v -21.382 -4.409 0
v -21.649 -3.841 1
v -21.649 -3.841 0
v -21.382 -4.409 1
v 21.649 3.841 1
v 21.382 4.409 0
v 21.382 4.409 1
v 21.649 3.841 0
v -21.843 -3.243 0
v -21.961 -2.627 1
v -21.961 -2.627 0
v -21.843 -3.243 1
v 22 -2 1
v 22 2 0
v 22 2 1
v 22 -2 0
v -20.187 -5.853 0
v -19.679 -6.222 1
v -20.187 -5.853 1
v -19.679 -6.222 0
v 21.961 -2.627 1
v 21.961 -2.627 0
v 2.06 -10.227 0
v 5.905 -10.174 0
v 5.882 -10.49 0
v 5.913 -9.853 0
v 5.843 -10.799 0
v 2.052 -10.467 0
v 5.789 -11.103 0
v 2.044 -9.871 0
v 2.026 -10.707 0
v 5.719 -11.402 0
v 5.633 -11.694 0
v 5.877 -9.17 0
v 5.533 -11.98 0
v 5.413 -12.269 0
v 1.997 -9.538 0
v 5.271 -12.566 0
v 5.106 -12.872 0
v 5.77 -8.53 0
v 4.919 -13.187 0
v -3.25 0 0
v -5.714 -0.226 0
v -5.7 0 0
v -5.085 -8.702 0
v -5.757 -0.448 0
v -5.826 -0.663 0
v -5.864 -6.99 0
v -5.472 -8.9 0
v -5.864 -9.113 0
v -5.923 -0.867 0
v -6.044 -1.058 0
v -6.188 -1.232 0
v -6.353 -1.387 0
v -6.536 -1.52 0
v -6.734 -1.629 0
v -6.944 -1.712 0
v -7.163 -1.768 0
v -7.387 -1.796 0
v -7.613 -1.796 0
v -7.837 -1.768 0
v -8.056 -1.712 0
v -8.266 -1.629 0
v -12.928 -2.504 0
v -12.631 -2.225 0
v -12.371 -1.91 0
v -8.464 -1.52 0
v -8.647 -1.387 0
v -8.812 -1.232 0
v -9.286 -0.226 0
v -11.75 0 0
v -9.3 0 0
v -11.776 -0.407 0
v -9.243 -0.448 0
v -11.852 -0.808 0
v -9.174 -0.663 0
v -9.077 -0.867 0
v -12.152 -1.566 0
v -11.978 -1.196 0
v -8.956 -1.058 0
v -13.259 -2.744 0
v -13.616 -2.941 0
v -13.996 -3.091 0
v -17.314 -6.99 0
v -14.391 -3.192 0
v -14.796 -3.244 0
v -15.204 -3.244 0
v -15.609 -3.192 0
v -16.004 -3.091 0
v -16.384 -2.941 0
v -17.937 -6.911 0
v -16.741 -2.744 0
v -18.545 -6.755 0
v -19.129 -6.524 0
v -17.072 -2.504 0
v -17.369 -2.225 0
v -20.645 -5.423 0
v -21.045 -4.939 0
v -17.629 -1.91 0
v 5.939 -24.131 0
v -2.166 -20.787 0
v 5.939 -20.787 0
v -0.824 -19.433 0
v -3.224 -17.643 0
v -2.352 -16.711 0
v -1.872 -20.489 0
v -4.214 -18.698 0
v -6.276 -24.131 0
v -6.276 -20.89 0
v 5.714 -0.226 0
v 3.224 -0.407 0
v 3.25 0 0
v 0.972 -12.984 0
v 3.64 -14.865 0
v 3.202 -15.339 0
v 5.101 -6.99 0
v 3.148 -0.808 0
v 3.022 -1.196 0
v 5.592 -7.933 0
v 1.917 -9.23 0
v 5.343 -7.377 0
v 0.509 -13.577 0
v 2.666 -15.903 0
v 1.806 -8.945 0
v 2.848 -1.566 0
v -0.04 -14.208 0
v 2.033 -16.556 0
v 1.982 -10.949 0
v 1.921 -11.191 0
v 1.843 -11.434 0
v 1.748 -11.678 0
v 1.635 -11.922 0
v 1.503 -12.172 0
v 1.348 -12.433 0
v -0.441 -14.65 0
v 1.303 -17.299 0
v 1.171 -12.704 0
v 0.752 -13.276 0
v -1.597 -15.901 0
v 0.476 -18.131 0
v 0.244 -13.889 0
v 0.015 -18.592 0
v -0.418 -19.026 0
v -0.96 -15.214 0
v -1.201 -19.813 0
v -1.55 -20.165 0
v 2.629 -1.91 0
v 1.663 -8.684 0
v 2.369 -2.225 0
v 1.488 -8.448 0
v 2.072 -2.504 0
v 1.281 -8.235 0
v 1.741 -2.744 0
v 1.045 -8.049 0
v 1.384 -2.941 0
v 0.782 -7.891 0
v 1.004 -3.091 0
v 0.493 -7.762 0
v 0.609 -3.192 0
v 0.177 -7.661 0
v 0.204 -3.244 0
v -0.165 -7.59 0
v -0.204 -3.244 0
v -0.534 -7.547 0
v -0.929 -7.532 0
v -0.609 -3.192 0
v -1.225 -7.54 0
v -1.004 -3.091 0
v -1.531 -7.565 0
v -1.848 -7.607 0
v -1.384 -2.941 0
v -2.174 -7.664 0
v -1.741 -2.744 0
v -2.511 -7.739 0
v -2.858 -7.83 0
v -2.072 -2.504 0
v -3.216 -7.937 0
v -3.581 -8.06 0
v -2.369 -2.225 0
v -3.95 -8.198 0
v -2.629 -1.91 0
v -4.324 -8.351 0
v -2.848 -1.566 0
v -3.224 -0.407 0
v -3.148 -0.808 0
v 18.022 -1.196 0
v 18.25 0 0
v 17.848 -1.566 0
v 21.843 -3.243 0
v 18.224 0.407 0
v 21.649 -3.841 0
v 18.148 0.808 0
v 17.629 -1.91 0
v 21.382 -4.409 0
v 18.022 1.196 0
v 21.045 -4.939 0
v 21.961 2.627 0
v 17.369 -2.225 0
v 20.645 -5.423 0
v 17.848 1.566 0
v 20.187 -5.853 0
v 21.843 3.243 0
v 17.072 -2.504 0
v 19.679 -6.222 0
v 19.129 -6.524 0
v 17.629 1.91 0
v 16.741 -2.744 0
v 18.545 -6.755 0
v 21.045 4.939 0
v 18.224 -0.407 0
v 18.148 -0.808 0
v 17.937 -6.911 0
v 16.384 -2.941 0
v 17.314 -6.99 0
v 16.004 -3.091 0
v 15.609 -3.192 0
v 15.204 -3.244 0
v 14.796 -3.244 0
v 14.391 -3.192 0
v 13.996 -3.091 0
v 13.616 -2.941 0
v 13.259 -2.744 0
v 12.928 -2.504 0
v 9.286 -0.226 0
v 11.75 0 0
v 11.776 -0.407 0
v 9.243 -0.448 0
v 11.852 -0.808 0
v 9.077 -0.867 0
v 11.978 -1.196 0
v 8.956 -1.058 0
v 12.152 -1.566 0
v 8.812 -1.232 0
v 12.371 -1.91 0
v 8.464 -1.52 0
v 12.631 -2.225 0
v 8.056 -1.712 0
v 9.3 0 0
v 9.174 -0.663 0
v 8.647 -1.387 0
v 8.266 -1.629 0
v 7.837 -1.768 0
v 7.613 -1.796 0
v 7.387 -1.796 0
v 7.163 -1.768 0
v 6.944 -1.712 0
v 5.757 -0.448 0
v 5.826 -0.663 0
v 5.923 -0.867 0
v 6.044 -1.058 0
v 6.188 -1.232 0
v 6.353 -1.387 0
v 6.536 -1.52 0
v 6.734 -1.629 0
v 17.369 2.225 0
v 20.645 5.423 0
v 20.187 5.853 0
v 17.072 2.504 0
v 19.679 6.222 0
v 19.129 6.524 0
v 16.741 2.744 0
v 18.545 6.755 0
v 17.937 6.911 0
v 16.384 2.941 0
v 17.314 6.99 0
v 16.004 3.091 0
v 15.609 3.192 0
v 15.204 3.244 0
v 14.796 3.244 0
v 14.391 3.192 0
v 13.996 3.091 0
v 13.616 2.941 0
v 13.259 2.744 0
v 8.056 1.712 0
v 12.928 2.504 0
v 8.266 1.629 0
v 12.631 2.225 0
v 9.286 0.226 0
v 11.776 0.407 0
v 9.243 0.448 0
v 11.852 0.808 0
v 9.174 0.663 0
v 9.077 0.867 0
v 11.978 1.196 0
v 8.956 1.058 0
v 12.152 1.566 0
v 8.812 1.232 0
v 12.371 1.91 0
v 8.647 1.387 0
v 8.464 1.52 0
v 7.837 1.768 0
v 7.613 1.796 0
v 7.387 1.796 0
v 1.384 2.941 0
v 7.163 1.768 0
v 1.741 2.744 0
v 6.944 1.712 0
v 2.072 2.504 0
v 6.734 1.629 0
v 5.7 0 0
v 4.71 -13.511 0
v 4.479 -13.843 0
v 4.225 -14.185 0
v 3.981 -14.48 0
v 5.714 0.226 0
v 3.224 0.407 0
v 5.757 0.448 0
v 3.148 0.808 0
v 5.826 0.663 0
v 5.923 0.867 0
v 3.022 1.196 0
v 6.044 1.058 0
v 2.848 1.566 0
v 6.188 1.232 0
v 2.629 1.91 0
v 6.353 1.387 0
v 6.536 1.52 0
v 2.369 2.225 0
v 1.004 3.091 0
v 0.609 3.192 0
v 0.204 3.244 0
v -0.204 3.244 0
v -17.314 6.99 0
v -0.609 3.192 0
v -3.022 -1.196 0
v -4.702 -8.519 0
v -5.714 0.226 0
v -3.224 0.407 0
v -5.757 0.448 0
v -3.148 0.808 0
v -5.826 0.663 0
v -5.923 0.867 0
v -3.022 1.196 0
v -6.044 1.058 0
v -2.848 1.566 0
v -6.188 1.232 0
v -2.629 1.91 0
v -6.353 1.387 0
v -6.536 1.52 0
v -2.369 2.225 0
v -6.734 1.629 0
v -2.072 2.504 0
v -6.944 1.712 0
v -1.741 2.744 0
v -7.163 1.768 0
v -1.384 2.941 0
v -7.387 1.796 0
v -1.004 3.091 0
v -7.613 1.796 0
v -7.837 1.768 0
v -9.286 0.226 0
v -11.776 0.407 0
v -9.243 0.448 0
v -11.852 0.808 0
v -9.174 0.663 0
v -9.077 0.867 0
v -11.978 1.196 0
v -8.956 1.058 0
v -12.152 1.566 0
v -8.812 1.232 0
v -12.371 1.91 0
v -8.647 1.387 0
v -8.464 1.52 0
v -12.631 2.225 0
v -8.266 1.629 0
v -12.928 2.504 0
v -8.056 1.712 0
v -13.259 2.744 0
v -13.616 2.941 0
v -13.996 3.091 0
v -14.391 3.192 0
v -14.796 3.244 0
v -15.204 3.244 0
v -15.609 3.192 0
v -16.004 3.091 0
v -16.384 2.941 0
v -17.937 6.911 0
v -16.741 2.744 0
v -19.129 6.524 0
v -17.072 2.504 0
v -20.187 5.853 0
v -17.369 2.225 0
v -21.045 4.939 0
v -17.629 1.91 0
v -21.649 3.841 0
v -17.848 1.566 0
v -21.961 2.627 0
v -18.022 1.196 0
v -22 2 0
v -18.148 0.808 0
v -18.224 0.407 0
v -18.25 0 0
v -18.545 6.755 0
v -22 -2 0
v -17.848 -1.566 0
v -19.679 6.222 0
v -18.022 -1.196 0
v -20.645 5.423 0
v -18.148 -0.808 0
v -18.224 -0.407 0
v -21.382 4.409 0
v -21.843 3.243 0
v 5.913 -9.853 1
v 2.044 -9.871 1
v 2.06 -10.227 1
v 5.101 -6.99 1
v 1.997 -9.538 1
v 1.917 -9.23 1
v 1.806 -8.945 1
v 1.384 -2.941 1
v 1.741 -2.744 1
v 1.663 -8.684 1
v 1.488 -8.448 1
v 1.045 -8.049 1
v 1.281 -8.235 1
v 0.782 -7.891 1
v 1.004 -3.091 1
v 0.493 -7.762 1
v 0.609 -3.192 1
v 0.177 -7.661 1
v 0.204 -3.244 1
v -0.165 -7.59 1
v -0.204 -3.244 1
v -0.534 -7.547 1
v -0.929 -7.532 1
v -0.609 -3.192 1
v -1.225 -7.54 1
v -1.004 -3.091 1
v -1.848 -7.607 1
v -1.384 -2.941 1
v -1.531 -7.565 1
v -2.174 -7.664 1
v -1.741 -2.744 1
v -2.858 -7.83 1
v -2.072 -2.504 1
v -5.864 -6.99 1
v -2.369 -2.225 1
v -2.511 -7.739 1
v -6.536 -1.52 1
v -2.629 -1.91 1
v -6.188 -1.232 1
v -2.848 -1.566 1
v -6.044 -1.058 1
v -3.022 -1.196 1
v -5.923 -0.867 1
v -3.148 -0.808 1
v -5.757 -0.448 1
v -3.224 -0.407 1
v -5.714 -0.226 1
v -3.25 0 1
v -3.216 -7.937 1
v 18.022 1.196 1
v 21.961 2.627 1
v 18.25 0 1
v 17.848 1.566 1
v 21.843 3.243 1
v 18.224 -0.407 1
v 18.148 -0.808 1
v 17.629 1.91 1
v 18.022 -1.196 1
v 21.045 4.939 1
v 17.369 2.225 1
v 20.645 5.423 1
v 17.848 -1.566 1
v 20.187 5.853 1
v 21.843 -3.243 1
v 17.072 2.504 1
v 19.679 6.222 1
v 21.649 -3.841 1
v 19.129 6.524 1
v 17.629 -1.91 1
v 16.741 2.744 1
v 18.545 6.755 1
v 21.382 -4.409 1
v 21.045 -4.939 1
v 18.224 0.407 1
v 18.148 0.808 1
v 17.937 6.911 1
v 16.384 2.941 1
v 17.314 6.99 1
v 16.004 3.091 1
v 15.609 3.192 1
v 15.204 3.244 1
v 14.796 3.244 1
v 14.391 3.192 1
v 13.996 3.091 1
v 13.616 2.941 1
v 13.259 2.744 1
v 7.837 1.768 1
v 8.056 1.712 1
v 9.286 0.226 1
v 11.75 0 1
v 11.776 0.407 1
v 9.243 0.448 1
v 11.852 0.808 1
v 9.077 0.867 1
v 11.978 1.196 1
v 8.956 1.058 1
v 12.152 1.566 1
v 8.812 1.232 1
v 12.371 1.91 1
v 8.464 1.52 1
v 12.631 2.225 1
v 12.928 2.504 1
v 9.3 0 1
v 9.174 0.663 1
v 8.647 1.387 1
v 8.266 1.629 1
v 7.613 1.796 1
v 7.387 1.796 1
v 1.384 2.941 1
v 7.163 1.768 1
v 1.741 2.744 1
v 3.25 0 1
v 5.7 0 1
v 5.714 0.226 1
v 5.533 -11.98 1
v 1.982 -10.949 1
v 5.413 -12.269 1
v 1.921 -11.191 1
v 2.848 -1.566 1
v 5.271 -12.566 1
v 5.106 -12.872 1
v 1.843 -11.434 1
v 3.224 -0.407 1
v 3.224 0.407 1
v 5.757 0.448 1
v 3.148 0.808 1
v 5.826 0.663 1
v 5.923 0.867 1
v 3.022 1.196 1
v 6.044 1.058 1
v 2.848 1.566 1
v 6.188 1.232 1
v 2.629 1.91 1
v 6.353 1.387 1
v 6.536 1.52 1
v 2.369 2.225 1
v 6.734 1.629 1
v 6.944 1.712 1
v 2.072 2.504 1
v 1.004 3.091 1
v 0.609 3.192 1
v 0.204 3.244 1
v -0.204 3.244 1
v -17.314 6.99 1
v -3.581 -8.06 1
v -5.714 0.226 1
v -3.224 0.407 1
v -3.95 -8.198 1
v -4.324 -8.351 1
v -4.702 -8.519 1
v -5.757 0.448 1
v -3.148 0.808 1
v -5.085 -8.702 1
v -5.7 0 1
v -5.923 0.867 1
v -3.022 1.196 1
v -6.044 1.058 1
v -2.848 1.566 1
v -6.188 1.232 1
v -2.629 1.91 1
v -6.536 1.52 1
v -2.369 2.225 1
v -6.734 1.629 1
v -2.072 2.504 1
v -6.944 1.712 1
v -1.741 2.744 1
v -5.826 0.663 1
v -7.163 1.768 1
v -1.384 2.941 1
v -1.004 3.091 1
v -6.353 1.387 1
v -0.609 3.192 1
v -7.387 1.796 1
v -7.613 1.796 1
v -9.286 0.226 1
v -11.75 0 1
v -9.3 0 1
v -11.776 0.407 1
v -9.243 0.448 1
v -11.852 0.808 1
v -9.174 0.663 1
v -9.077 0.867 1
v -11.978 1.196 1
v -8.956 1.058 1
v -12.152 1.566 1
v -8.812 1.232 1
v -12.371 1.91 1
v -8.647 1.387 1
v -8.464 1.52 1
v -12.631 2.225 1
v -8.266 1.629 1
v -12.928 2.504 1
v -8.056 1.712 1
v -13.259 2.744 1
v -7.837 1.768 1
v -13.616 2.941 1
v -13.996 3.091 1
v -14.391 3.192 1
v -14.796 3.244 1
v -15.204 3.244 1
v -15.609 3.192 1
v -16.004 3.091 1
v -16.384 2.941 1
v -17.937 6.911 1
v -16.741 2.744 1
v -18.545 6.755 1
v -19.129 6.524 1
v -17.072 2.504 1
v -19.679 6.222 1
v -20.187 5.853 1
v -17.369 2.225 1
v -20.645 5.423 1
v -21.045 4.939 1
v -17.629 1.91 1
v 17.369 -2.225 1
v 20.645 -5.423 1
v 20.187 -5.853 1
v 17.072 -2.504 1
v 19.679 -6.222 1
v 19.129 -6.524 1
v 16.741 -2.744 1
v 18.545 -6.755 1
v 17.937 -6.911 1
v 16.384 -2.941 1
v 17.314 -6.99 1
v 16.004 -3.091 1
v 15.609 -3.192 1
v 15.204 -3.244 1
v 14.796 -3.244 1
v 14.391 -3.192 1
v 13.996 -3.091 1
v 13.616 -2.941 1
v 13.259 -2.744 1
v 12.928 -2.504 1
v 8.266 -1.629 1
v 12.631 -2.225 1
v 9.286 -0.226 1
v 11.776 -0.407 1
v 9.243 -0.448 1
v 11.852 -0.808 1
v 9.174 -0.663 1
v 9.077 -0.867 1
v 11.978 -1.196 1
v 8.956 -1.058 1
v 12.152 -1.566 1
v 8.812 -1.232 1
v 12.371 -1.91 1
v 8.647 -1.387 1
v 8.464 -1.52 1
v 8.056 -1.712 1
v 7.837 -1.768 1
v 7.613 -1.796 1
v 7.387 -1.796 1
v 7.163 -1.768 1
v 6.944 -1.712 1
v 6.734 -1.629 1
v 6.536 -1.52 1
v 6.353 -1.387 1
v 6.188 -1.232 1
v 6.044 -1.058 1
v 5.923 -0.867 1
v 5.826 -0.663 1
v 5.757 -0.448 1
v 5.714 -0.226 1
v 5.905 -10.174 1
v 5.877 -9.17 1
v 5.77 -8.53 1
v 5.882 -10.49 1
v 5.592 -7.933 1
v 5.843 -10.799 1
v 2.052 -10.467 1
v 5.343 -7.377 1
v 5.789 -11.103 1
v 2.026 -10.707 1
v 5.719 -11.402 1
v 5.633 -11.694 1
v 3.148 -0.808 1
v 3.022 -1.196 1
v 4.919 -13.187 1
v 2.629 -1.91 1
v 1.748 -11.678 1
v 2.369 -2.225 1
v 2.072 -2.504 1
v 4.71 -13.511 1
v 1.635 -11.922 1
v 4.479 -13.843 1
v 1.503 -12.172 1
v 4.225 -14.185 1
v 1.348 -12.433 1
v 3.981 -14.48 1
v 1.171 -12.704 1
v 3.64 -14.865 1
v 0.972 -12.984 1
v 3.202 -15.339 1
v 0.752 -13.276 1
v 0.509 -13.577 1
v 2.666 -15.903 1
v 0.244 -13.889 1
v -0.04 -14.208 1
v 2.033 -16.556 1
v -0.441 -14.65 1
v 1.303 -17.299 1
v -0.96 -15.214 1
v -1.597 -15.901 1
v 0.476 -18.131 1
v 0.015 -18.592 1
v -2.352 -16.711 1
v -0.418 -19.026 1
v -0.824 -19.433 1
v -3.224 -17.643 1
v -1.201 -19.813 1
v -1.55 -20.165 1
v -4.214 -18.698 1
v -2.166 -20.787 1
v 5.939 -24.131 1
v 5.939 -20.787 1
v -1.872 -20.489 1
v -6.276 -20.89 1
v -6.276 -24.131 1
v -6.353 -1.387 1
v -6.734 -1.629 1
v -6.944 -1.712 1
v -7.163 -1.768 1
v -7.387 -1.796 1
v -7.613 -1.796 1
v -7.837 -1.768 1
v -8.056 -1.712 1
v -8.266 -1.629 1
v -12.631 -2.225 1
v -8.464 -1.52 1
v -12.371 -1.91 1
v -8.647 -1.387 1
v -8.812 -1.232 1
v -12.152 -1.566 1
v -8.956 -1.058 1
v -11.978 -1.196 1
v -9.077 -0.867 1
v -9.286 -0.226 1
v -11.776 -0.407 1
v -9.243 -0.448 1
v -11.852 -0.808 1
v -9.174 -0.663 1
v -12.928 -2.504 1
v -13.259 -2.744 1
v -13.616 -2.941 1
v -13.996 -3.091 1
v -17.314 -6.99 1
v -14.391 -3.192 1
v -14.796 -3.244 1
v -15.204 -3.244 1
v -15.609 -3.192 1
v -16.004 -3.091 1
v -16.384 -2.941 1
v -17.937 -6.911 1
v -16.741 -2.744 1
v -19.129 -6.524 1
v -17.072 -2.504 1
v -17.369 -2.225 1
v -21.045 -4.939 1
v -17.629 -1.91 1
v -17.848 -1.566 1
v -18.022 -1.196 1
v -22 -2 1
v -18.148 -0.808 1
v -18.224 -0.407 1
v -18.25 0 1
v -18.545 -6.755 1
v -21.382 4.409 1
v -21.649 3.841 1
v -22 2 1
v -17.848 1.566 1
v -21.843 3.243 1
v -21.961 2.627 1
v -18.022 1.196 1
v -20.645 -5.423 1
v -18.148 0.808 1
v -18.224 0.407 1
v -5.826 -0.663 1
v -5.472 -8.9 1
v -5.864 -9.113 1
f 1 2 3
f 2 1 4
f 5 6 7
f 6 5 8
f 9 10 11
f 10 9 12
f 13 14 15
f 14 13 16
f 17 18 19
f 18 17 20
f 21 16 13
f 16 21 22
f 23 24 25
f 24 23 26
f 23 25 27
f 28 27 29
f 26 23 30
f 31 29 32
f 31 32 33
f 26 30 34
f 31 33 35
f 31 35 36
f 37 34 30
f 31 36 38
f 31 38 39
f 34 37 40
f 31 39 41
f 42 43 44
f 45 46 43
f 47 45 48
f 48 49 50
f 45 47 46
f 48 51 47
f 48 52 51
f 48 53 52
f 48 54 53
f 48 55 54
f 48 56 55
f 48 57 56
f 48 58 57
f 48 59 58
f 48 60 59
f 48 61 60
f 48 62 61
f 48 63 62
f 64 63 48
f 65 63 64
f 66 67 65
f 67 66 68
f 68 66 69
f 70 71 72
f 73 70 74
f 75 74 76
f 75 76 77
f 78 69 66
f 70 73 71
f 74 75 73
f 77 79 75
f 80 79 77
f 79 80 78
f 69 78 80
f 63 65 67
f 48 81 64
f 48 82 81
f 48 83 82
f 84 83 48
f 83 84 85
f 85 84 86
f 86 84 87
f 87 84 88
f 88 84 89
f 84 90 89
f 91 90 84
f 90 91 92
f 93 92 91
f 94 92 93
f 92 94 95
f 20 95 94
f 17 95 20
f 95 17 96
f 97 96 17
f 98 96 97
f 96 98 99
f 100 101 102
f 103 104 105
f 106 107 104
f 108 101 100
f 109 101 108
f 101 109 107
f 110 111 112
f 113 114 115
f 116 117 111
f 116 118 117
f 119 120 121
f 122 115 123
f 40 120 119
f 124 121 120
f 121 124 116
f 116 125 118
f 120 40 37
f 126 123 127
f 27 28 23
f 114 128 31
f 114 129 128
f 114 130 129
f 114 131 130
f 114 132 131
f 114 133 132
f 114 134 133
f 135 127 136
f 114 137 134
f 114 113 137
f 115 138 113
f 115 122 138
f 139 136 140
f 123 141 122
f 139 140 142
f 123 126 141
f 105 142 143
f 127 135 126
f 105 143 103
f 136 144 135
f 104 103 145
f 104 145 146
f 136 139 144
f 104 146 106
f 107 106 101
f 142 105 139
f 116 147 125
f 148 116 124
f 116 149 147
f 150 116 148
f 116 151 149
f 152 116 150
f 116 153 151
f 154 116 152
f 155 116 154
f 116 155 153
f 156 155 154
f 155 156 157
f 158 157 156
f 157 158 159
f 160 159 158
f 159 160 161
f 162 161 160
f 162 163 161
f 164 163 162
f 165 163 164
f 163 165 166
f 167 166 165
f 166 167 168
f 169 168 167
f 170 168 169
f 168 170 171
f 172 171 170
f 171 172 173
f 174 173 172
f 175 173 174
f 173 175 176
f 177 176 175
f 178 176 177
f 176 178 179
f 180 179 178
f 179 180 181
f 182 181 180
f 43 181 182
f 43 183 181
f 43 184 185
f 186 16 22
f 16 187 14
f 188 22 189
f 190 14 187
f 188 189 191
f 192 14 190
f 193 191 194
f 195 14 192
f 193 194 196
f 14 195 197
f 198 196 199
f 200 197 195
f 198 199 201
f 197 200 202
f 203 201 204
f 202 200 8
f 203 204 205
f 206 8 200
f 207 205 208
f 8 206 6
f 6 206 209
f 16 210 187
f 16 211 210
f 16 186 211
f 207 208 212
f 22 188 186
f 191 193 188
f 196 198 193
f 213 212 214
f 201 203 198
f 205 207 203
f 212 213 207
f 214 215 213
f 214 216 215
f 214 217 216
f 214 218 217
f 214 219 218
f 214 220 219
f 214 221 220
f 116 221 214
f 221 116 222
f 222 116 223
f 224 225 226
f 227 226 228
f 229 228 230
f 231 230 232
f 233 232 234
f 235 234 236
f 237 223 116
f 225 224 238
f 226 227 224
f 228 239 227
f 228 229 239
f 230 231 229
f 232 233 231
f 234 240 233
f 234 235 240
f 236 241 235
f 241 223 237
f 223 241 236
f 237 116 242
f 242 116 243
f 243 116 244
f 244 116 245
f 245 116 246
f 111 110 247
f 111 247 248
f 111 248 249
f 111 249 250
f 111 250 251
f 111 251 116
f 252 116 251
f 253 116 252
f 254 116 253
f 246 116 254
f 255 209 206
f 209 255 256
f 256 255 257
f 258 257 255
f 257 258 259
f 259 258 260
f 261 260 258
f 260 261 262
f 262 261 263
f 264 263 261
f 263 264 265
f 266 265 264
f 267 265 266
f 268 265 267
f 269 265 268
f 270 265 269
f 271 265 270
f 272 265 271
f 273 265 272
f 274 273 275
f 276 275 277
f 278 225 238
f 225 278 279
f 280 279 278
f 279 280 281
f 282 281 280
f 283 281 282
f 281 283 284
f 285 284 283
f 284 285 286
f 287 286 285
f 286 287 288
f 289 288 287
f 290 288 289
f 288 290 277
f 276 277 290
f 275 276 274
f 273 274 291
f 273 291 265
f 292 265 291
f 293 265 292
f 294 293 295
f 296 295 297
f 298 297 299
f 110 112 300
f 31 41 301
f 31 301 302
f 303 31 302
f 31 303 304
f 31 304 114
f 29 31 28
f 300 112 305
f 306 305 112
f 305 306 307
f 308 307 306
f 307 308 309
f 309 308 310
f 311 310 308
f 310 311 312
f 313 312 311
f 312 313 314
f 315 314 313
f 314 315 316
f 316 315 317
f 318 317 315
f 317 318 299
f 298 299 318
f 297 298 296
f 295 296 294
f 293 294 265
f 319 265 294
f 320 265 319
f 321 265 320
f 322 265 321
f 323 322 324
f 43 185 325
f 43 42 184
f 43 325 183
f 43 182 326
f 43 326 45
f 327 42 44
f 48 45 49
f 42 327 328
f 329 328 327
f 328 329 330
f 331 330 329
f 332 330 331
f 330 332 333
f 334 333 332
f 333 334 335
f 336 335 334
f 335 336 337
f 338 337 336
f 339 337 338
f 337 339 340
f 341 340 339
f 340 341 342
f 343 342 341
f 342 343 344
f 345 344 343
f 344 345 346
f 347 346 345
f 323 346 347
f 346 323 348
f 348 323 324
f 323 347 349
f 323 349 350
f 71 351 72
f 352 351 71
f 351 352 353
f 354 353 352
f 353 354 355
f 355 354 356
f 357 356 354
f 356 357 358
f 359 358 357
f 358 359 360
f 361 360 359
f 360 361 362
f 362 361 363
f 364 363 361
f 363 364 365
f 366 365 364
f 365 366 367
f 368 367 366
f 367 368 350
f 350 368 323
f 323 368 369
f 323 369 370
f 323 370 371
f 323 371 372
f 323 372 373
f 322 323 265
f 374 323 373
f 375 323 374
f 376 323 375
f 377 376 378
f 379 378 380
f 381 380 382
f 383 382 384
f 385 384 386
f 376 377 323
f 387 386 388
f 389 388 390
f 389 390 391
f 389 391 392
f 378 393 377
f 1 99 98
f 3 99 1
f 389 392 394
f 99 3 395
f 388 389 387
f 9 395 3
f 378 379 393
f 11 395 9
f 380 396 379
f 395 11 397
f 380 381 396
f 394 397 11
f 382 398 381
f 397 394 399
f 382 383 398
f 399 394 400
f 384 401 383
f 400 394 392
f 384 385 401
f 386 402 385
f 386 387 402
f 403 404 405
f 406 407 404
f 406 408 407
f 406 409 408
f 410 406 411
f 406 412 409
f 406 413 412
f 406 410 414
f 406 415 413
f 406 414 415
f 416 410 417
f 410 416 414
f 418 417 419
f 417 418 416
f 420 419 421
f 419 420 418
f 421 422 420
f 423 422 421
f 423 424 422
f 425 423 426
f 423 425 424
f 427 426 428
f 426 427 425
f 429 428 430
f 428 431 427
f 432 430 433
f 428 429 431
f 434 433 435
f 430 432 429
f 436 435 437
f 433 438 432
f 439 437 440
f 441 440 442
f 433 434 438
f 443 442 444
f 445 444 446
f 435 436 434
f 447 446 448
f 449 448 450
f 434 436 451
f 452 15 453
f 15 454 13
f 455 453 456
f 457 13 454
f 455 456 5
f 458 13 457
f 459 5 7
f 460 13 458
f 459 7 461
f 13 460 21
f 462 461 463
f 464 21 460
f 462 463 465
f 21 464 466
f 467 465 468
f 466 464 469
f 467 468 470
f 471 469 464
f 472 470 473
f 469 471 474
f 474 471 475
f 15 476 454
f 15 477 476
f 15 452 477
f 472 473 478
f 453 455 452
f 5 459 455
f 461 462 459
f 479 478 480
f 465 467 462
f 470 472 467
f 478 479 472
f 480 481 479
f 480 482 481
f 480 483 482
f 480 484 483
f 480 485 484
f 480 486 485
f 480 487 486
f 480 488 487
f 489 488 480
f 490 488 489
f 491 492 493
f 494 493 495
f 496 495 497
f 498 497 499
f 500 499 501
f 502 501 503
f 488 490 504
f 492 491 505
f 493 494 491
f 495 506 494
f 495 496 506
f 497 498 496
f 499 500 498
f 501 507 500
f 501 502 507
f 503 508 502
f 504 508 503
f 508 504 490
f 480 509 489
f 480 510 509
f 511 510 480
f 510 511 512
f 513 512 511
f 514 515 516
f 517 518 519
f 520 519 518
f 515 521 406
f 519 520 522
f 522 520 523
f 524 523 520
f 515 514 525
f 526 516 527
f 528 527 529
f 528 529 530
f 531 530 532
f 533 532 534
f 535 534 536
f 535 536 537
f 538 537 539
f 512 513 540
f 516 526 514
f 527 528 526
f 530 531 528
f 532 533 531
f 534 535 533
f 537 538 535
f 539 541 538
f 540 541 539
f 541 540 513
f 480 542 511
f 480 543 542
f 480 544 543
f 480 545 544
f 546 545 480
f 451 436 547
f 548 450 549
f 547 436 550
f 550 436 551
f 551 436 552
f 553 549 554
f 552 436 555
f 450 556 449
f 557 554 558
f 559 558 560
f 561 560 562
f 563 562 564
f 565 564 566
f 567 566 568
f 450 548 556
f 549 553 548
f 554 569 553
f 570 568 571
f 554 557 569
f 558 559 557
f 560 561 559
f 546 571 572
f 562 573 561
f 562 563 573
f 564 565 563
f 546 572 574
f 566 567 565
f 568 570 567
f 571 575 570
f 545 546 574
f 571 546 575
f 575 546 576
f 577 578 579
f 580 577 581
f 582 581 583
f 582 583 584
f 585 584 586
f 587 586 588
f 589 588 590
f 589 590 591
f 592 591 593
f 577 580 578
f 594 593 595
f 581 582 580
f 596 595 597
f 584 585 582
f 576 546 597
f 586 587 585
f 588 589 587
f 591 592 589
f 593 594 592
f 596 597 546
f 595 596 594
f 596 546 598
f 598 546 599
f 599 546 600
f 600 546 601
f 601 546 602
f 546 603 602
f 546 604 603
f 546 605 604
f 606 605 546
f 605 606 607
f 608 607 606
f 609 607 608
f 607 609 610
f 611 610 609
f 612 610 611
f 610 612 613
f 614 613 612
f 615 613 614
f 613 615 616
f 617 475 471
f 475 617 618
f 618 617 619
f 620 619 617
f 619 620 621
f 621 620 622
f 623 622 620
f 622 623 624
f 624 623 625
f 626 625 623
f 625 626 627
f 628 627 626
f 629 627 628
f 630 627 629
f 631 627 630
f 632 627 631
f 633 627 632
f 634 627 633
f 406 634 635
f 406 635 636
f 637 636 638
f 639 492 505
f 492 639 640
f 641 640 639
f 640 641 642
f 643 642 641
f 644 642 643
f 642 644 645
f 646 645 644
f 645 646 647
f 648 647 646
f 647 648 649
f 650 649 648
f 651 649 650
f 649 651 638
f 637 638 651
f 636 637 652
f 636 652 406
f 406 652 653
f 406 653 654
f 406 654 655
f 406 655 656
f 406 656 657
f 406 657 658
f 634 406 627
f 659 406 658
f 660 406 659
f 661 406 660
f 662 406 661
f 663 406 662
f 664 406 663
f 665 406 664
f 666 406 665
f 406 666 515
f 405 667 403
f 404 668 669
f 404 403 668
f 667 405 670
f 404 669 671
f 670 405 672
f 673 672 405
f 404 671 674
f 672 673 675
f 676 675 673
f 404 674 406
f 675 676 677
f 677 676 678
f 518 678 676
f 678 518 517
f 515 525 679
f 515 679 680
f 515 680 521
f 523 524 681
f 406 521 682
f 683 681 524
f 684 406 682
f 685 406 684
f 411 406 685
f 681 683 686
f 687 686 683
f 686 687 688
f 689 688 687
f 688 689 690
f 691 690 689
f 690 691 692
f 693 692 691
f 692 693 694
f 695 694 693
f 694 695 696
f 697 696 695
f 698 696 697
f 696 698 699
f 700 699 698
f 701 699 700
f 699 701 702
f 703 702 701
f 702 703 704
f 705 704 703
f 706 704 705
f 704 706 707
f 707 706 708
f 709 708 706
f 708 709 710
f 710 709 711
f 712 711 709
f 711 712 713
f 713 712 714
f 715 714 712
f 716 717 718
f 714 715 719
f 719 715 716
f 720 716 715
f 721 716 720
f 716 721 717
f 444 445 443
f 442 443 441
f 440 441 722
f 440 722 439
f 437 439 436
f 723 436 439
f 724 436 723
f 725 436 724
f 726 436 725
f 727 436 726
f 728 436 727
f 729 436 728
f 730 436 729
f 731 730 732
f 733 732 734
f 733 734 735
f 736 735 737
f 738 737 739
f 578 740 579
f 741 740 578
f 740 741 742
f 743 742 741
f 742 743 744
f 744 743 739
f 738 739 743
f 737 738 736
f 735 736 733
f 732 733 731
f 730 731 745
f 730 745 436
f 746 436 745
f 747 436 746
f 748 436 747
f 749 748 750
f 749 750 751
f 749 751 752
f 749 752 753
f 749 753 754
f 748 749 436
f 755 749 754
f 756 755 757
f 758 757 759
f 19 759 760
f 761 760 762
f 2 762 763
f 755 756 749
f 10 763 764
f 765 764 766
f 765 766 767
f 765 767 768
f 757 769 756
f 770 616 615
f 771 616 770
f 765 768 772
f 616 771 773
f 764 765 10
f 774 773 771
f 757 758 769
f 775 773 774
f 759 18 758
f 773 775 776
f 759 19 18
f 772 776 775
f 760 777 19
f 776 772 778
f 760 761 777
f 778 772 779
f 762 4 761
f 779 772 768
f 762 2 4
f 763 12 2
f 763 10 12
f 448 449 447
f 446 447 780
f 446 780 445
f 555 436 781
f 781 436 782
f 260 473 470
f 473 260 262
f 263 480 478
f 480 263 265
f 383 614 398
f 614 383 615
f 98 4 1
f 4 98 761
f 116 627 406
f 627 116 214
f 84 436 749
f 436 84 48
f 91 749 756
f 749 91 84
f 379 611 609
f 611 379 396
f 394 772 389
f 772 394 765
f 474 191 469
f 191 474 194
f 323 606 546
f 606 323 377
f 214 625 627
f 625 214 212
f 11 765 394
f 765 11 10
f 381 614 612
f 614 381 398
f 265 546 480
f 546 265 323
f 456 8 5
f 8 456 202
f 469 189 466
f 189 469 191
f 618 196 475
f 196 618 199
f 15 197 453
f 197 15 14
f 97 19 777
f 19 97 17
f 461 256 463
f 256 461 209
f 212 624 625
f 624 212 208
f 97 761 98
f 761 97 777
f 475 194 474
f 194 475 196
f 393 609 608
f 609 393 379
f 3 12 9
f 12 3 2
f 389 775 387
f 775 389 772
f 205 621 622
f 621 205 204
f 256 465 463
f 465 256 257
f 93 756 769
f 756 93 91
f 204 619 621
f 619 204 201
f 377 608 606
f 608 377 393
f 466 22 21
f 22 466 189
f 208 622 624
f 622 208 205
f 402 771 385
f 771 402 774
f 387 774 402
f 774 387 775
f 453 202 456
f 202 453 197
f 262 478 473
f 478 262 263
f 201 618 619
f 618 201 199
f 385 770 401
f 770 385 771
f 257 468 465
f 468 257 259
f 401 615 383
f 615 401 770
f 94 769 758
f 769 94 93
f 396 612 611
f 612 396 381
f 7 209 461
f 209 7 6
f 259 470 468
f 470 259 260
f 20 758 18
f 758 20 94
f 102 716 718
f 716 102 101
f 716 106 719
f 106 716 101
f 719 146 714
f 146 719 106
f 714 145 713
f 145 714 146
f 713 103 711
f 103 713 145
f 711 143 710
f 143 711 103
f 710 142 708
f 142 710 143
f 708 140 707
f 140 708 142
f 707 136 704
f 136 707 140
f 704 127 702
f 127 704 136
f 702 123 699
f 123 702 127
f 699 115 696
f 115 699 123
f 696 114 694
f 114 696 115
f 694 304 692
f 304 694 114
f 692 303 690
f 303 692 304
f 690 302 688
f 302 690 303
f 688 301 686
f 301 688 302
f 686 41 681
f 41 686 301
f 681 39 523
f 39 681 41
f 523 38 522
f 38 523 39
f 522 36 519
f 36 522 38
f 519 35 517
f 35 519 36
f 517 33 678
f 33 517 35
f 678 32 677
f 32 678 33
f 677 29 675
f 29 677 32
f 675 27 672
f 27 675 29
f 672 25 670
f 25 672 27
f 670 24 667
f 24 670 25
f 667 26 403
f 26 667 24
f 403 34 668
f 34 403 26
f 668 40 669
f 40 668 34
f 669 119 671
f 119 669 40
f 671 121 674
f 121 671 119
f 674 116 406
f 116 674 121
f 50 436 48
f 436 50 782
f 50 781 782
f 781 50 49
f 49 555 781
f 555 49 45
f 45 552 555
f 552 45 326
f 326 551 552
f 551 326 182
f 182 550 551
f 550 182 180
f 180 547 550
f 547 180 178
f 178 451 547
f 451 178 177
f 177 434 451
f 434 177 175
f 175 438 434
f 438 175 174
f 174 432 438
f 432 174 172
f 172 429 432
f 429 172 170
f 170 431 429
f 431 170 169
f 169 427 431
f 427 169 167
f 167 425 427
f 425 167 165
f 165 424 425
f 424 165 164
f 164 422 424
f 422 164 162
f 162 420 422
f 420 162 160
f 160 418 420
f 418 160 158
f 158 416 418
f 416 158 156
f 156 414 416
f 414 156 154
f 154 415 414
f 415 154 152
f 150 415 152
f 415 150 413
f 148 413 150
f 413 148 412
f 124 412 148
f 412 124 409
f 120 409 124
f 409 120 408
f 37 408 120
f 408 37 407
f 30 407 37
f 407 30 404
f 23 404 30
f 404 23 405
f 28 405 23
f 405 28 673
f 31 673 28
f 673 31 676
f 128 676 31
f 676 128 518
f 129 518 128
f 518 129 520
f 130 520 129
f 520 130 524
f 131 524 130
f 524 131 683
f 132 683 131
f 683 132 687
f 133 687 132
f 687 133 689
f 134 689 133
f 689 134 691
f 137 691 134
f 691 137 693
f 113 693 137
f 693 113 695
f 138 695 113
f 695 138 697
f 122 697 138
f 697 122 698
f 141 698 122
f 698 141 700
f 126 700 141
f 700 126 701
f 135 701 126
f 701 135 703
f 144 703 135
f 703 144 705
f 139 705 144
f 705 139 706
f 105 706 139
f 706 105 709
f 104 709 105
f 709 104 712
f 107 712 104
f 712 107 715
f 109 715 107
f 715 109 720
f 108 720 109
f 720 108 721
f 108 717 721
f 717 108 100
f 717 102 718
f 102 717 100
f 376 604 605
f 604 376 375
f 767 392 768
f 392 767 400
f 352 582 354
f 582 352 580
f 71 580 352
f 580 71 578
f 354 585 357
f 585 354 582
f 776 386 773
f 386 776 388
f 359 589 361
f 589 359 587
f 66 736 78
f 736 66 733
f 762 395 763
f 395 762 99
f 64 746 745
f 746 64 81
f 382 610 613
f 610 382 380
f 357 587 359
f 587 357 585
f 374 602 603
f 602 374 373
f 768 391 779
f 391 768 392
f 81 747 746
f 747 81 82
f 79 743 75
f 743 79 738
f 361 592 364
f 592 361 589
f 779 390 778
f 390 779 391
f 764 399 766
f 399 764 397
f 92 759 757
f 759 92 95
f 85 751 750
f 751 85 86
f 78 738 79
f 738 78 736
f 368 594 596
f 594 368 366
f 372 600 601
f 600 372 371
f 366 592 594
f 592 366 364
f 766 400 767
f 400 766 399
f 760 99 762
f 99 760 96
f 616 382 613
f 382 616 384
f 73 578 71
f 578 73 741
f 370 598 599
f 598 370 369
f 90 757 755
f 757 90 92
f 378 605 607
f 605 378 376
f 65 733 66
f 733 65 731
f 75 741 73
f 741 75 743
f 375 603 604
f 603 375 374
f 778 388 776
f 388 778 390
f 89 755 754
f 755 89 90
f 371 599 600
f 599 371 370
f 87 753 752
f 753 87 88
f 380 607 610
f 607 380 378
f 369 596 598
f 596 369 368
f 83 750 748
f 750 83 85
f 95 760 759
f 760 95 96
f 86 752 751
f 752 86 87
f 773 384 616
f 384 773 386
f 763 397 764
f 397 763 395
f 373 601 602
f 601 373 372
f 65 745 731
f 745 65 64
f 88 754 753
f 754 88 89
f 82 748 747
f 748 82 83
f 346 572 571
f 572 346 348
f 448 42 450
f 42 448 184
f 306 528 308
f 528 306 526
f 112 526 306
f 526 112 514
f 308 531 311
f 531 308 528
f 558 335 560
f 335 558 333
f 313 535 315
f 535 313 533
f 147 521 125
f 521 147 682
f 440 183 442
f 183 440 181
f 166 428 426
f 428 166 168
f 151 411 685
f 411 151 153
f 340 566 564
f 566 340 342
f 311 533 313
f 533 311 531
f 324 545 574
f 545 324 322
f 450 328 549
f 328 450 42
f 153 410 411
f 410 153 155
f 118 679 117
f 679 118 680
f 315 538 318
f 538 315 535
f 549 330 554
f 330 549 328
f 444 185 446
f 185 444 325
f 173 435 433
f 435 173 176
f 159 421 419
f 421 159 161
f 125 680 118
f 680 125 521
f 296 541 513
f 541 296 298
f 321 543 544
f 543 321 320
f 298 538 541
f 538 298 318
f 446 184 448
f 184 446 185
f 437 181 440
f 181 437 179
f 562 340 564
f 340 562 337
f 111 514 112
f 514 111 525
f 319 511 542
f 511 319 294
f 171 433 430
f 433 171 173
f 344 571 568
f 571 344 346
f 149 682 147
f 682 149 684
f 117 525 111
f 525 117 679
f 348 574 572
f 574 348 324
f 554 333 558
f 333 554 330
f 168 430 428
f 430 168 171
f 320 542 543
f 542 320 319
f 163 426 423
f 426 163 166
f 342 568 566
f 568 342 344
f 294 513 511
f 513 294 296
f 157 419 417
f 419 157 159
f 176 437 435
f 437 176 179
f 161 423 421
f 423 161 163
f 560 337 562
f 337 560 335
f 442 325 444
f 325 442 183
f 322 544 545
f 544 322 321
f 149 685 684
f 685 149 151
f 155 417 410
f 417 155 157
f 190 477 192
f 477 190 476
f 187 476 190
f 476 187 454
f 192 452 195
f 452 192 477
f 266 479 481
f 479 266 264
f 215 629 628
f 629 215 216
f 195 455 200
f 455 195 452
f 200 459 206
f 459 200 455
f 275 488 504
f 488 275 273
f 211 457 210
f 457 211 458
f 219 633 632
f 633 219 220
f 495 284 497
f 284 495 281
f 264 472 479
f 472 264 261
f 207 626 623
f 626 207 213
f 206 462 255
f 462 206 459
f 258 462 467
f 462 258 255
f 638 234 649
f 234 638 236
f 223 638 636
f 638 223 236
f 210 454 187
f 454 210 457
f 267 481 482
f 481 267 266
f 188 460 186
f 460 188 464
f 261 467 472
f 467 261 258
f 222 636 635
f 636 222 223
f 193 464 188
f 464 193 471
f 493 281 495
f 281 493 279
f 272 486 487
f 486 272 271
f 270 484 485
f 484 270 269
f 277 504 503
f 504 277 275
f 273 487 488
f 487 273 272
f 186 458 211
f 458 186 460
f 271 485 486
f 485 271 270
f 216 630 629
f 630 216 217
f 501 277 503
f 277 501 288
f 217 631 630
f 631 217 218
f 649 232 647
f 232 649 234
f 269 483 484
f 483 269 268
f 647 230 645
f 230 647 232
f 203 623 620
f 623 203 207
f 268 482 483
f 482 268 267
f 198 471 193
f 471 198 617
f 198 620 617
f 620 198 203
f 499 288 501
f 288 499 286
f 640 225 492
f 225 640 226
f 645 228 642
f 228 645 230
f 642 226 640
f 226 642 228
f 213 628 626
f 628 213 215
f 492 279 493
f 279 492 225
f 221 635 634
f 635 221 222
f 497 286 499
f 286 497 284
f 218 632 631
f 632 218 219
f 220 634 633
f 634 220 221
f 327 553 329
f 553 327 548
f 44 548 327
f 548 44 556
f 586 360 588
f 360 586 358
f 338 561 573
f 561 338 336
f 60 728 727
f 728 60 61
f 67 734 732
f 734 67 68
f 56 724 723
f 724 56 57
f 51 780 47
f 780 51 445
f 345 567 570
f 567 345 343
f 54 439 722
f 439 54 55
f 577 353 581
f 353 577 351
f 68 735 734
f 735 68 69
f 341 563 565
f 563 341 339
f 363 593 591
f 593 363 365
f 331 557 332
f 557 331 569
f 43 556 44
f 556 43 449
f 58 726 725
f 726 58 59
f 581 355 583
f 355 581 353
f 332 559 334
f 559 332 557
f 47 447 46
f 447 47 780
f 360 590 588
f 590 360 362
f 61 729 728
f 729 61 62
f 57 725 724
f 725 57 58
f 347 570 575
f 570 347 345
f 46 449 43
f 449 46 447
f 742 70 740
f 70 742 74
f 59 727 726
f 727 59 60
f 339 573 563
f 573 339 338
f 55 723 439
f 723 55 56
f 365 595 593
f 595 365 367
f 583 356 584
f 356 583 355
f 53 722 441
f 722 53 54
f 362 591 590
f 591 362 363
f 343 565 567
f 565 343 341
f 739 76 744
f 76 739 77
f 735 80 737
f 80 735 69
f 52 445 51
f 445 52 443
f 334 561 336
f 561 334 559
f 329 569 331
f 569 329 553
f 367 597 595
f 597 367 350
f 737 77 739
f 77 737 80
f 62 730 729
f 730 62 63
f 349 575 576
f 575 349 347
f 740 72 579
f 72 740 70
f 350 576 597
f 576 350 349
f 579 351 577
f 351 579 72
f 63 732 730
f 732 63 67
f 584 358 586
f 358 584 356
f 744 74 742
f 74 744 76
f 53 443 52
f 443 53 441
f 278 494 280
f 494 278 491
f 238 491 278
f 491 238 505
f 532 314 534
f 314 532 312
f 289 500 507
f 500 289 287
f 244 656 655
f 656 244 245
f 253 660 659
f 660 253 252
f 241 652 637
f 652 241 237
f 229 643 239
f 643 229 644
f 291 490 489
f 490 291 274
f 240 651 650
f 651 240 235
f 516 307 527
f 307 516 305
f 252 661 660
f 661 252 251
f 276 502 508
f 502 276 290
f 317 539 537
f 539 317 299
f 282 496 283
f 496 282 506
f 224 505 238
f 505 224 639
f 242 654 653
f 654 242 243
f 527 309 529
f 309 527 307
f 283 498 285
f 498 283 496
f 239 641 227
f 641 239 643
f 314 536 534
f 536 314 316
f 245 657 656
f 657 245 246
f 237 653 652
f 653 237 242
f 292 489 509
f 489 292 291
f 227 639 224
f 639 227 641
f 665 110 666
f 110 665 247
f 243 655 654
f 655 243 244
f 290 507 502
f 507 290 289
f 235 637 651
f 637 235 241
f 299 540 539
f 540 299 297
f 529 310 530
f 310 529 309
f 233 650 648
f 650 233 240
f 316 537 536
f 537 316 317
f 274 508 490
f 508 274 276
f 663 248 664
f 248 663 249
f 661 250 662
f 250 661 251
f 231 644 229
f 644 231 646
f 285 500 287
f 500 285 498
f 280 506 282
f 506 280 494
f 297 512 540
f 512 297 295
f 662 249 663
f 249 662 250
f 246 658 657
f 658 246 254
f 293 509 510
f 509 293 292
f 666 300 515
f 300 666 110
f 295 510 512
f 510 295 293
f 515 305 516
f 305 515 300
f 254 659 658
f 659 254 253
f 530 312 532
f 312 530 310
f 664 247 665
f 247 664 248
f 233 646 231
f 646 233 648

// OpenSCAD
$fn = 50;


difference() {
	union() {
		hull() {
			translate(v = [-17.0000000000, 2.0000000000, 0]) {
				cylinder(h = 1, r = 5);
			}
			translate(v = [17.0000000000, 2.0000000000, 0]) {
				cylinder(h = 1, r = 5);
			}
			translate(v = [-17.0000000000, -2.0000000000, 0]) {
				cylinder(h = 1, r = 5);
			}
			translate(v = [17.0000000000, -2.0000000000, 0]) {
				cylinder(h = 1, r = 5);
			}
		}
		translate(v = [0, -5, 0]) {
			linear_extrude(height = 1) {
				text(font = "DejaVu Sans Mono:style=Bold", halign = "center", size = 19.0000000000, text = "2", valign = "top");
			}
		}
	}
	union() {
		translate(v = [-15.0000000000, 0.0000000000, 0]) {
			translate(v = [0, 0, -100]) {
				cylinder(h = 200, r = 3.2500000000);
			}
		}
		translate(v = [0, 0, -100]) {
			cylinder(h = 200, r = 3.2500000000);
		}
		translate(v = [15.0000000000, 0.0000000000, 0]) {
			translate(v = [0, 0, -100]) {
				cylinder(h = 200, r = 3.2500000000);
			}
		}
		translate(v = [-15.0000000000, 0.0000000000, 0]) {
			translate(v = [0, 0, -100]) {
				cylinder(h = 200, r = 1.8000000000);
			}
		}
		translate(v = [-7.5000000000, 0.0000000000, 0]) {
			translate(v = [0, 0, -100]) {
				cylinder(h = 200, r = 1.8000000000);
			}
		}
		translate(v = [0, 0, -100]) {
			cylinder(h = 200, r = 1.8000000000);
		}
		translate(v = [7.5000000000, 0.0000000000, 0]) {
			translate(v = [0, 0, -100]) {
				cylinder(h = 200, r = 1.8000000000);
			}
		}
		translate(v = [15.0000000000, 0.0000000000, 0]) {
			translate(v = [0, 0, -100]) {
				cylinder(h = 200, r = 1.8000000000);
			}
		}
	}
}
